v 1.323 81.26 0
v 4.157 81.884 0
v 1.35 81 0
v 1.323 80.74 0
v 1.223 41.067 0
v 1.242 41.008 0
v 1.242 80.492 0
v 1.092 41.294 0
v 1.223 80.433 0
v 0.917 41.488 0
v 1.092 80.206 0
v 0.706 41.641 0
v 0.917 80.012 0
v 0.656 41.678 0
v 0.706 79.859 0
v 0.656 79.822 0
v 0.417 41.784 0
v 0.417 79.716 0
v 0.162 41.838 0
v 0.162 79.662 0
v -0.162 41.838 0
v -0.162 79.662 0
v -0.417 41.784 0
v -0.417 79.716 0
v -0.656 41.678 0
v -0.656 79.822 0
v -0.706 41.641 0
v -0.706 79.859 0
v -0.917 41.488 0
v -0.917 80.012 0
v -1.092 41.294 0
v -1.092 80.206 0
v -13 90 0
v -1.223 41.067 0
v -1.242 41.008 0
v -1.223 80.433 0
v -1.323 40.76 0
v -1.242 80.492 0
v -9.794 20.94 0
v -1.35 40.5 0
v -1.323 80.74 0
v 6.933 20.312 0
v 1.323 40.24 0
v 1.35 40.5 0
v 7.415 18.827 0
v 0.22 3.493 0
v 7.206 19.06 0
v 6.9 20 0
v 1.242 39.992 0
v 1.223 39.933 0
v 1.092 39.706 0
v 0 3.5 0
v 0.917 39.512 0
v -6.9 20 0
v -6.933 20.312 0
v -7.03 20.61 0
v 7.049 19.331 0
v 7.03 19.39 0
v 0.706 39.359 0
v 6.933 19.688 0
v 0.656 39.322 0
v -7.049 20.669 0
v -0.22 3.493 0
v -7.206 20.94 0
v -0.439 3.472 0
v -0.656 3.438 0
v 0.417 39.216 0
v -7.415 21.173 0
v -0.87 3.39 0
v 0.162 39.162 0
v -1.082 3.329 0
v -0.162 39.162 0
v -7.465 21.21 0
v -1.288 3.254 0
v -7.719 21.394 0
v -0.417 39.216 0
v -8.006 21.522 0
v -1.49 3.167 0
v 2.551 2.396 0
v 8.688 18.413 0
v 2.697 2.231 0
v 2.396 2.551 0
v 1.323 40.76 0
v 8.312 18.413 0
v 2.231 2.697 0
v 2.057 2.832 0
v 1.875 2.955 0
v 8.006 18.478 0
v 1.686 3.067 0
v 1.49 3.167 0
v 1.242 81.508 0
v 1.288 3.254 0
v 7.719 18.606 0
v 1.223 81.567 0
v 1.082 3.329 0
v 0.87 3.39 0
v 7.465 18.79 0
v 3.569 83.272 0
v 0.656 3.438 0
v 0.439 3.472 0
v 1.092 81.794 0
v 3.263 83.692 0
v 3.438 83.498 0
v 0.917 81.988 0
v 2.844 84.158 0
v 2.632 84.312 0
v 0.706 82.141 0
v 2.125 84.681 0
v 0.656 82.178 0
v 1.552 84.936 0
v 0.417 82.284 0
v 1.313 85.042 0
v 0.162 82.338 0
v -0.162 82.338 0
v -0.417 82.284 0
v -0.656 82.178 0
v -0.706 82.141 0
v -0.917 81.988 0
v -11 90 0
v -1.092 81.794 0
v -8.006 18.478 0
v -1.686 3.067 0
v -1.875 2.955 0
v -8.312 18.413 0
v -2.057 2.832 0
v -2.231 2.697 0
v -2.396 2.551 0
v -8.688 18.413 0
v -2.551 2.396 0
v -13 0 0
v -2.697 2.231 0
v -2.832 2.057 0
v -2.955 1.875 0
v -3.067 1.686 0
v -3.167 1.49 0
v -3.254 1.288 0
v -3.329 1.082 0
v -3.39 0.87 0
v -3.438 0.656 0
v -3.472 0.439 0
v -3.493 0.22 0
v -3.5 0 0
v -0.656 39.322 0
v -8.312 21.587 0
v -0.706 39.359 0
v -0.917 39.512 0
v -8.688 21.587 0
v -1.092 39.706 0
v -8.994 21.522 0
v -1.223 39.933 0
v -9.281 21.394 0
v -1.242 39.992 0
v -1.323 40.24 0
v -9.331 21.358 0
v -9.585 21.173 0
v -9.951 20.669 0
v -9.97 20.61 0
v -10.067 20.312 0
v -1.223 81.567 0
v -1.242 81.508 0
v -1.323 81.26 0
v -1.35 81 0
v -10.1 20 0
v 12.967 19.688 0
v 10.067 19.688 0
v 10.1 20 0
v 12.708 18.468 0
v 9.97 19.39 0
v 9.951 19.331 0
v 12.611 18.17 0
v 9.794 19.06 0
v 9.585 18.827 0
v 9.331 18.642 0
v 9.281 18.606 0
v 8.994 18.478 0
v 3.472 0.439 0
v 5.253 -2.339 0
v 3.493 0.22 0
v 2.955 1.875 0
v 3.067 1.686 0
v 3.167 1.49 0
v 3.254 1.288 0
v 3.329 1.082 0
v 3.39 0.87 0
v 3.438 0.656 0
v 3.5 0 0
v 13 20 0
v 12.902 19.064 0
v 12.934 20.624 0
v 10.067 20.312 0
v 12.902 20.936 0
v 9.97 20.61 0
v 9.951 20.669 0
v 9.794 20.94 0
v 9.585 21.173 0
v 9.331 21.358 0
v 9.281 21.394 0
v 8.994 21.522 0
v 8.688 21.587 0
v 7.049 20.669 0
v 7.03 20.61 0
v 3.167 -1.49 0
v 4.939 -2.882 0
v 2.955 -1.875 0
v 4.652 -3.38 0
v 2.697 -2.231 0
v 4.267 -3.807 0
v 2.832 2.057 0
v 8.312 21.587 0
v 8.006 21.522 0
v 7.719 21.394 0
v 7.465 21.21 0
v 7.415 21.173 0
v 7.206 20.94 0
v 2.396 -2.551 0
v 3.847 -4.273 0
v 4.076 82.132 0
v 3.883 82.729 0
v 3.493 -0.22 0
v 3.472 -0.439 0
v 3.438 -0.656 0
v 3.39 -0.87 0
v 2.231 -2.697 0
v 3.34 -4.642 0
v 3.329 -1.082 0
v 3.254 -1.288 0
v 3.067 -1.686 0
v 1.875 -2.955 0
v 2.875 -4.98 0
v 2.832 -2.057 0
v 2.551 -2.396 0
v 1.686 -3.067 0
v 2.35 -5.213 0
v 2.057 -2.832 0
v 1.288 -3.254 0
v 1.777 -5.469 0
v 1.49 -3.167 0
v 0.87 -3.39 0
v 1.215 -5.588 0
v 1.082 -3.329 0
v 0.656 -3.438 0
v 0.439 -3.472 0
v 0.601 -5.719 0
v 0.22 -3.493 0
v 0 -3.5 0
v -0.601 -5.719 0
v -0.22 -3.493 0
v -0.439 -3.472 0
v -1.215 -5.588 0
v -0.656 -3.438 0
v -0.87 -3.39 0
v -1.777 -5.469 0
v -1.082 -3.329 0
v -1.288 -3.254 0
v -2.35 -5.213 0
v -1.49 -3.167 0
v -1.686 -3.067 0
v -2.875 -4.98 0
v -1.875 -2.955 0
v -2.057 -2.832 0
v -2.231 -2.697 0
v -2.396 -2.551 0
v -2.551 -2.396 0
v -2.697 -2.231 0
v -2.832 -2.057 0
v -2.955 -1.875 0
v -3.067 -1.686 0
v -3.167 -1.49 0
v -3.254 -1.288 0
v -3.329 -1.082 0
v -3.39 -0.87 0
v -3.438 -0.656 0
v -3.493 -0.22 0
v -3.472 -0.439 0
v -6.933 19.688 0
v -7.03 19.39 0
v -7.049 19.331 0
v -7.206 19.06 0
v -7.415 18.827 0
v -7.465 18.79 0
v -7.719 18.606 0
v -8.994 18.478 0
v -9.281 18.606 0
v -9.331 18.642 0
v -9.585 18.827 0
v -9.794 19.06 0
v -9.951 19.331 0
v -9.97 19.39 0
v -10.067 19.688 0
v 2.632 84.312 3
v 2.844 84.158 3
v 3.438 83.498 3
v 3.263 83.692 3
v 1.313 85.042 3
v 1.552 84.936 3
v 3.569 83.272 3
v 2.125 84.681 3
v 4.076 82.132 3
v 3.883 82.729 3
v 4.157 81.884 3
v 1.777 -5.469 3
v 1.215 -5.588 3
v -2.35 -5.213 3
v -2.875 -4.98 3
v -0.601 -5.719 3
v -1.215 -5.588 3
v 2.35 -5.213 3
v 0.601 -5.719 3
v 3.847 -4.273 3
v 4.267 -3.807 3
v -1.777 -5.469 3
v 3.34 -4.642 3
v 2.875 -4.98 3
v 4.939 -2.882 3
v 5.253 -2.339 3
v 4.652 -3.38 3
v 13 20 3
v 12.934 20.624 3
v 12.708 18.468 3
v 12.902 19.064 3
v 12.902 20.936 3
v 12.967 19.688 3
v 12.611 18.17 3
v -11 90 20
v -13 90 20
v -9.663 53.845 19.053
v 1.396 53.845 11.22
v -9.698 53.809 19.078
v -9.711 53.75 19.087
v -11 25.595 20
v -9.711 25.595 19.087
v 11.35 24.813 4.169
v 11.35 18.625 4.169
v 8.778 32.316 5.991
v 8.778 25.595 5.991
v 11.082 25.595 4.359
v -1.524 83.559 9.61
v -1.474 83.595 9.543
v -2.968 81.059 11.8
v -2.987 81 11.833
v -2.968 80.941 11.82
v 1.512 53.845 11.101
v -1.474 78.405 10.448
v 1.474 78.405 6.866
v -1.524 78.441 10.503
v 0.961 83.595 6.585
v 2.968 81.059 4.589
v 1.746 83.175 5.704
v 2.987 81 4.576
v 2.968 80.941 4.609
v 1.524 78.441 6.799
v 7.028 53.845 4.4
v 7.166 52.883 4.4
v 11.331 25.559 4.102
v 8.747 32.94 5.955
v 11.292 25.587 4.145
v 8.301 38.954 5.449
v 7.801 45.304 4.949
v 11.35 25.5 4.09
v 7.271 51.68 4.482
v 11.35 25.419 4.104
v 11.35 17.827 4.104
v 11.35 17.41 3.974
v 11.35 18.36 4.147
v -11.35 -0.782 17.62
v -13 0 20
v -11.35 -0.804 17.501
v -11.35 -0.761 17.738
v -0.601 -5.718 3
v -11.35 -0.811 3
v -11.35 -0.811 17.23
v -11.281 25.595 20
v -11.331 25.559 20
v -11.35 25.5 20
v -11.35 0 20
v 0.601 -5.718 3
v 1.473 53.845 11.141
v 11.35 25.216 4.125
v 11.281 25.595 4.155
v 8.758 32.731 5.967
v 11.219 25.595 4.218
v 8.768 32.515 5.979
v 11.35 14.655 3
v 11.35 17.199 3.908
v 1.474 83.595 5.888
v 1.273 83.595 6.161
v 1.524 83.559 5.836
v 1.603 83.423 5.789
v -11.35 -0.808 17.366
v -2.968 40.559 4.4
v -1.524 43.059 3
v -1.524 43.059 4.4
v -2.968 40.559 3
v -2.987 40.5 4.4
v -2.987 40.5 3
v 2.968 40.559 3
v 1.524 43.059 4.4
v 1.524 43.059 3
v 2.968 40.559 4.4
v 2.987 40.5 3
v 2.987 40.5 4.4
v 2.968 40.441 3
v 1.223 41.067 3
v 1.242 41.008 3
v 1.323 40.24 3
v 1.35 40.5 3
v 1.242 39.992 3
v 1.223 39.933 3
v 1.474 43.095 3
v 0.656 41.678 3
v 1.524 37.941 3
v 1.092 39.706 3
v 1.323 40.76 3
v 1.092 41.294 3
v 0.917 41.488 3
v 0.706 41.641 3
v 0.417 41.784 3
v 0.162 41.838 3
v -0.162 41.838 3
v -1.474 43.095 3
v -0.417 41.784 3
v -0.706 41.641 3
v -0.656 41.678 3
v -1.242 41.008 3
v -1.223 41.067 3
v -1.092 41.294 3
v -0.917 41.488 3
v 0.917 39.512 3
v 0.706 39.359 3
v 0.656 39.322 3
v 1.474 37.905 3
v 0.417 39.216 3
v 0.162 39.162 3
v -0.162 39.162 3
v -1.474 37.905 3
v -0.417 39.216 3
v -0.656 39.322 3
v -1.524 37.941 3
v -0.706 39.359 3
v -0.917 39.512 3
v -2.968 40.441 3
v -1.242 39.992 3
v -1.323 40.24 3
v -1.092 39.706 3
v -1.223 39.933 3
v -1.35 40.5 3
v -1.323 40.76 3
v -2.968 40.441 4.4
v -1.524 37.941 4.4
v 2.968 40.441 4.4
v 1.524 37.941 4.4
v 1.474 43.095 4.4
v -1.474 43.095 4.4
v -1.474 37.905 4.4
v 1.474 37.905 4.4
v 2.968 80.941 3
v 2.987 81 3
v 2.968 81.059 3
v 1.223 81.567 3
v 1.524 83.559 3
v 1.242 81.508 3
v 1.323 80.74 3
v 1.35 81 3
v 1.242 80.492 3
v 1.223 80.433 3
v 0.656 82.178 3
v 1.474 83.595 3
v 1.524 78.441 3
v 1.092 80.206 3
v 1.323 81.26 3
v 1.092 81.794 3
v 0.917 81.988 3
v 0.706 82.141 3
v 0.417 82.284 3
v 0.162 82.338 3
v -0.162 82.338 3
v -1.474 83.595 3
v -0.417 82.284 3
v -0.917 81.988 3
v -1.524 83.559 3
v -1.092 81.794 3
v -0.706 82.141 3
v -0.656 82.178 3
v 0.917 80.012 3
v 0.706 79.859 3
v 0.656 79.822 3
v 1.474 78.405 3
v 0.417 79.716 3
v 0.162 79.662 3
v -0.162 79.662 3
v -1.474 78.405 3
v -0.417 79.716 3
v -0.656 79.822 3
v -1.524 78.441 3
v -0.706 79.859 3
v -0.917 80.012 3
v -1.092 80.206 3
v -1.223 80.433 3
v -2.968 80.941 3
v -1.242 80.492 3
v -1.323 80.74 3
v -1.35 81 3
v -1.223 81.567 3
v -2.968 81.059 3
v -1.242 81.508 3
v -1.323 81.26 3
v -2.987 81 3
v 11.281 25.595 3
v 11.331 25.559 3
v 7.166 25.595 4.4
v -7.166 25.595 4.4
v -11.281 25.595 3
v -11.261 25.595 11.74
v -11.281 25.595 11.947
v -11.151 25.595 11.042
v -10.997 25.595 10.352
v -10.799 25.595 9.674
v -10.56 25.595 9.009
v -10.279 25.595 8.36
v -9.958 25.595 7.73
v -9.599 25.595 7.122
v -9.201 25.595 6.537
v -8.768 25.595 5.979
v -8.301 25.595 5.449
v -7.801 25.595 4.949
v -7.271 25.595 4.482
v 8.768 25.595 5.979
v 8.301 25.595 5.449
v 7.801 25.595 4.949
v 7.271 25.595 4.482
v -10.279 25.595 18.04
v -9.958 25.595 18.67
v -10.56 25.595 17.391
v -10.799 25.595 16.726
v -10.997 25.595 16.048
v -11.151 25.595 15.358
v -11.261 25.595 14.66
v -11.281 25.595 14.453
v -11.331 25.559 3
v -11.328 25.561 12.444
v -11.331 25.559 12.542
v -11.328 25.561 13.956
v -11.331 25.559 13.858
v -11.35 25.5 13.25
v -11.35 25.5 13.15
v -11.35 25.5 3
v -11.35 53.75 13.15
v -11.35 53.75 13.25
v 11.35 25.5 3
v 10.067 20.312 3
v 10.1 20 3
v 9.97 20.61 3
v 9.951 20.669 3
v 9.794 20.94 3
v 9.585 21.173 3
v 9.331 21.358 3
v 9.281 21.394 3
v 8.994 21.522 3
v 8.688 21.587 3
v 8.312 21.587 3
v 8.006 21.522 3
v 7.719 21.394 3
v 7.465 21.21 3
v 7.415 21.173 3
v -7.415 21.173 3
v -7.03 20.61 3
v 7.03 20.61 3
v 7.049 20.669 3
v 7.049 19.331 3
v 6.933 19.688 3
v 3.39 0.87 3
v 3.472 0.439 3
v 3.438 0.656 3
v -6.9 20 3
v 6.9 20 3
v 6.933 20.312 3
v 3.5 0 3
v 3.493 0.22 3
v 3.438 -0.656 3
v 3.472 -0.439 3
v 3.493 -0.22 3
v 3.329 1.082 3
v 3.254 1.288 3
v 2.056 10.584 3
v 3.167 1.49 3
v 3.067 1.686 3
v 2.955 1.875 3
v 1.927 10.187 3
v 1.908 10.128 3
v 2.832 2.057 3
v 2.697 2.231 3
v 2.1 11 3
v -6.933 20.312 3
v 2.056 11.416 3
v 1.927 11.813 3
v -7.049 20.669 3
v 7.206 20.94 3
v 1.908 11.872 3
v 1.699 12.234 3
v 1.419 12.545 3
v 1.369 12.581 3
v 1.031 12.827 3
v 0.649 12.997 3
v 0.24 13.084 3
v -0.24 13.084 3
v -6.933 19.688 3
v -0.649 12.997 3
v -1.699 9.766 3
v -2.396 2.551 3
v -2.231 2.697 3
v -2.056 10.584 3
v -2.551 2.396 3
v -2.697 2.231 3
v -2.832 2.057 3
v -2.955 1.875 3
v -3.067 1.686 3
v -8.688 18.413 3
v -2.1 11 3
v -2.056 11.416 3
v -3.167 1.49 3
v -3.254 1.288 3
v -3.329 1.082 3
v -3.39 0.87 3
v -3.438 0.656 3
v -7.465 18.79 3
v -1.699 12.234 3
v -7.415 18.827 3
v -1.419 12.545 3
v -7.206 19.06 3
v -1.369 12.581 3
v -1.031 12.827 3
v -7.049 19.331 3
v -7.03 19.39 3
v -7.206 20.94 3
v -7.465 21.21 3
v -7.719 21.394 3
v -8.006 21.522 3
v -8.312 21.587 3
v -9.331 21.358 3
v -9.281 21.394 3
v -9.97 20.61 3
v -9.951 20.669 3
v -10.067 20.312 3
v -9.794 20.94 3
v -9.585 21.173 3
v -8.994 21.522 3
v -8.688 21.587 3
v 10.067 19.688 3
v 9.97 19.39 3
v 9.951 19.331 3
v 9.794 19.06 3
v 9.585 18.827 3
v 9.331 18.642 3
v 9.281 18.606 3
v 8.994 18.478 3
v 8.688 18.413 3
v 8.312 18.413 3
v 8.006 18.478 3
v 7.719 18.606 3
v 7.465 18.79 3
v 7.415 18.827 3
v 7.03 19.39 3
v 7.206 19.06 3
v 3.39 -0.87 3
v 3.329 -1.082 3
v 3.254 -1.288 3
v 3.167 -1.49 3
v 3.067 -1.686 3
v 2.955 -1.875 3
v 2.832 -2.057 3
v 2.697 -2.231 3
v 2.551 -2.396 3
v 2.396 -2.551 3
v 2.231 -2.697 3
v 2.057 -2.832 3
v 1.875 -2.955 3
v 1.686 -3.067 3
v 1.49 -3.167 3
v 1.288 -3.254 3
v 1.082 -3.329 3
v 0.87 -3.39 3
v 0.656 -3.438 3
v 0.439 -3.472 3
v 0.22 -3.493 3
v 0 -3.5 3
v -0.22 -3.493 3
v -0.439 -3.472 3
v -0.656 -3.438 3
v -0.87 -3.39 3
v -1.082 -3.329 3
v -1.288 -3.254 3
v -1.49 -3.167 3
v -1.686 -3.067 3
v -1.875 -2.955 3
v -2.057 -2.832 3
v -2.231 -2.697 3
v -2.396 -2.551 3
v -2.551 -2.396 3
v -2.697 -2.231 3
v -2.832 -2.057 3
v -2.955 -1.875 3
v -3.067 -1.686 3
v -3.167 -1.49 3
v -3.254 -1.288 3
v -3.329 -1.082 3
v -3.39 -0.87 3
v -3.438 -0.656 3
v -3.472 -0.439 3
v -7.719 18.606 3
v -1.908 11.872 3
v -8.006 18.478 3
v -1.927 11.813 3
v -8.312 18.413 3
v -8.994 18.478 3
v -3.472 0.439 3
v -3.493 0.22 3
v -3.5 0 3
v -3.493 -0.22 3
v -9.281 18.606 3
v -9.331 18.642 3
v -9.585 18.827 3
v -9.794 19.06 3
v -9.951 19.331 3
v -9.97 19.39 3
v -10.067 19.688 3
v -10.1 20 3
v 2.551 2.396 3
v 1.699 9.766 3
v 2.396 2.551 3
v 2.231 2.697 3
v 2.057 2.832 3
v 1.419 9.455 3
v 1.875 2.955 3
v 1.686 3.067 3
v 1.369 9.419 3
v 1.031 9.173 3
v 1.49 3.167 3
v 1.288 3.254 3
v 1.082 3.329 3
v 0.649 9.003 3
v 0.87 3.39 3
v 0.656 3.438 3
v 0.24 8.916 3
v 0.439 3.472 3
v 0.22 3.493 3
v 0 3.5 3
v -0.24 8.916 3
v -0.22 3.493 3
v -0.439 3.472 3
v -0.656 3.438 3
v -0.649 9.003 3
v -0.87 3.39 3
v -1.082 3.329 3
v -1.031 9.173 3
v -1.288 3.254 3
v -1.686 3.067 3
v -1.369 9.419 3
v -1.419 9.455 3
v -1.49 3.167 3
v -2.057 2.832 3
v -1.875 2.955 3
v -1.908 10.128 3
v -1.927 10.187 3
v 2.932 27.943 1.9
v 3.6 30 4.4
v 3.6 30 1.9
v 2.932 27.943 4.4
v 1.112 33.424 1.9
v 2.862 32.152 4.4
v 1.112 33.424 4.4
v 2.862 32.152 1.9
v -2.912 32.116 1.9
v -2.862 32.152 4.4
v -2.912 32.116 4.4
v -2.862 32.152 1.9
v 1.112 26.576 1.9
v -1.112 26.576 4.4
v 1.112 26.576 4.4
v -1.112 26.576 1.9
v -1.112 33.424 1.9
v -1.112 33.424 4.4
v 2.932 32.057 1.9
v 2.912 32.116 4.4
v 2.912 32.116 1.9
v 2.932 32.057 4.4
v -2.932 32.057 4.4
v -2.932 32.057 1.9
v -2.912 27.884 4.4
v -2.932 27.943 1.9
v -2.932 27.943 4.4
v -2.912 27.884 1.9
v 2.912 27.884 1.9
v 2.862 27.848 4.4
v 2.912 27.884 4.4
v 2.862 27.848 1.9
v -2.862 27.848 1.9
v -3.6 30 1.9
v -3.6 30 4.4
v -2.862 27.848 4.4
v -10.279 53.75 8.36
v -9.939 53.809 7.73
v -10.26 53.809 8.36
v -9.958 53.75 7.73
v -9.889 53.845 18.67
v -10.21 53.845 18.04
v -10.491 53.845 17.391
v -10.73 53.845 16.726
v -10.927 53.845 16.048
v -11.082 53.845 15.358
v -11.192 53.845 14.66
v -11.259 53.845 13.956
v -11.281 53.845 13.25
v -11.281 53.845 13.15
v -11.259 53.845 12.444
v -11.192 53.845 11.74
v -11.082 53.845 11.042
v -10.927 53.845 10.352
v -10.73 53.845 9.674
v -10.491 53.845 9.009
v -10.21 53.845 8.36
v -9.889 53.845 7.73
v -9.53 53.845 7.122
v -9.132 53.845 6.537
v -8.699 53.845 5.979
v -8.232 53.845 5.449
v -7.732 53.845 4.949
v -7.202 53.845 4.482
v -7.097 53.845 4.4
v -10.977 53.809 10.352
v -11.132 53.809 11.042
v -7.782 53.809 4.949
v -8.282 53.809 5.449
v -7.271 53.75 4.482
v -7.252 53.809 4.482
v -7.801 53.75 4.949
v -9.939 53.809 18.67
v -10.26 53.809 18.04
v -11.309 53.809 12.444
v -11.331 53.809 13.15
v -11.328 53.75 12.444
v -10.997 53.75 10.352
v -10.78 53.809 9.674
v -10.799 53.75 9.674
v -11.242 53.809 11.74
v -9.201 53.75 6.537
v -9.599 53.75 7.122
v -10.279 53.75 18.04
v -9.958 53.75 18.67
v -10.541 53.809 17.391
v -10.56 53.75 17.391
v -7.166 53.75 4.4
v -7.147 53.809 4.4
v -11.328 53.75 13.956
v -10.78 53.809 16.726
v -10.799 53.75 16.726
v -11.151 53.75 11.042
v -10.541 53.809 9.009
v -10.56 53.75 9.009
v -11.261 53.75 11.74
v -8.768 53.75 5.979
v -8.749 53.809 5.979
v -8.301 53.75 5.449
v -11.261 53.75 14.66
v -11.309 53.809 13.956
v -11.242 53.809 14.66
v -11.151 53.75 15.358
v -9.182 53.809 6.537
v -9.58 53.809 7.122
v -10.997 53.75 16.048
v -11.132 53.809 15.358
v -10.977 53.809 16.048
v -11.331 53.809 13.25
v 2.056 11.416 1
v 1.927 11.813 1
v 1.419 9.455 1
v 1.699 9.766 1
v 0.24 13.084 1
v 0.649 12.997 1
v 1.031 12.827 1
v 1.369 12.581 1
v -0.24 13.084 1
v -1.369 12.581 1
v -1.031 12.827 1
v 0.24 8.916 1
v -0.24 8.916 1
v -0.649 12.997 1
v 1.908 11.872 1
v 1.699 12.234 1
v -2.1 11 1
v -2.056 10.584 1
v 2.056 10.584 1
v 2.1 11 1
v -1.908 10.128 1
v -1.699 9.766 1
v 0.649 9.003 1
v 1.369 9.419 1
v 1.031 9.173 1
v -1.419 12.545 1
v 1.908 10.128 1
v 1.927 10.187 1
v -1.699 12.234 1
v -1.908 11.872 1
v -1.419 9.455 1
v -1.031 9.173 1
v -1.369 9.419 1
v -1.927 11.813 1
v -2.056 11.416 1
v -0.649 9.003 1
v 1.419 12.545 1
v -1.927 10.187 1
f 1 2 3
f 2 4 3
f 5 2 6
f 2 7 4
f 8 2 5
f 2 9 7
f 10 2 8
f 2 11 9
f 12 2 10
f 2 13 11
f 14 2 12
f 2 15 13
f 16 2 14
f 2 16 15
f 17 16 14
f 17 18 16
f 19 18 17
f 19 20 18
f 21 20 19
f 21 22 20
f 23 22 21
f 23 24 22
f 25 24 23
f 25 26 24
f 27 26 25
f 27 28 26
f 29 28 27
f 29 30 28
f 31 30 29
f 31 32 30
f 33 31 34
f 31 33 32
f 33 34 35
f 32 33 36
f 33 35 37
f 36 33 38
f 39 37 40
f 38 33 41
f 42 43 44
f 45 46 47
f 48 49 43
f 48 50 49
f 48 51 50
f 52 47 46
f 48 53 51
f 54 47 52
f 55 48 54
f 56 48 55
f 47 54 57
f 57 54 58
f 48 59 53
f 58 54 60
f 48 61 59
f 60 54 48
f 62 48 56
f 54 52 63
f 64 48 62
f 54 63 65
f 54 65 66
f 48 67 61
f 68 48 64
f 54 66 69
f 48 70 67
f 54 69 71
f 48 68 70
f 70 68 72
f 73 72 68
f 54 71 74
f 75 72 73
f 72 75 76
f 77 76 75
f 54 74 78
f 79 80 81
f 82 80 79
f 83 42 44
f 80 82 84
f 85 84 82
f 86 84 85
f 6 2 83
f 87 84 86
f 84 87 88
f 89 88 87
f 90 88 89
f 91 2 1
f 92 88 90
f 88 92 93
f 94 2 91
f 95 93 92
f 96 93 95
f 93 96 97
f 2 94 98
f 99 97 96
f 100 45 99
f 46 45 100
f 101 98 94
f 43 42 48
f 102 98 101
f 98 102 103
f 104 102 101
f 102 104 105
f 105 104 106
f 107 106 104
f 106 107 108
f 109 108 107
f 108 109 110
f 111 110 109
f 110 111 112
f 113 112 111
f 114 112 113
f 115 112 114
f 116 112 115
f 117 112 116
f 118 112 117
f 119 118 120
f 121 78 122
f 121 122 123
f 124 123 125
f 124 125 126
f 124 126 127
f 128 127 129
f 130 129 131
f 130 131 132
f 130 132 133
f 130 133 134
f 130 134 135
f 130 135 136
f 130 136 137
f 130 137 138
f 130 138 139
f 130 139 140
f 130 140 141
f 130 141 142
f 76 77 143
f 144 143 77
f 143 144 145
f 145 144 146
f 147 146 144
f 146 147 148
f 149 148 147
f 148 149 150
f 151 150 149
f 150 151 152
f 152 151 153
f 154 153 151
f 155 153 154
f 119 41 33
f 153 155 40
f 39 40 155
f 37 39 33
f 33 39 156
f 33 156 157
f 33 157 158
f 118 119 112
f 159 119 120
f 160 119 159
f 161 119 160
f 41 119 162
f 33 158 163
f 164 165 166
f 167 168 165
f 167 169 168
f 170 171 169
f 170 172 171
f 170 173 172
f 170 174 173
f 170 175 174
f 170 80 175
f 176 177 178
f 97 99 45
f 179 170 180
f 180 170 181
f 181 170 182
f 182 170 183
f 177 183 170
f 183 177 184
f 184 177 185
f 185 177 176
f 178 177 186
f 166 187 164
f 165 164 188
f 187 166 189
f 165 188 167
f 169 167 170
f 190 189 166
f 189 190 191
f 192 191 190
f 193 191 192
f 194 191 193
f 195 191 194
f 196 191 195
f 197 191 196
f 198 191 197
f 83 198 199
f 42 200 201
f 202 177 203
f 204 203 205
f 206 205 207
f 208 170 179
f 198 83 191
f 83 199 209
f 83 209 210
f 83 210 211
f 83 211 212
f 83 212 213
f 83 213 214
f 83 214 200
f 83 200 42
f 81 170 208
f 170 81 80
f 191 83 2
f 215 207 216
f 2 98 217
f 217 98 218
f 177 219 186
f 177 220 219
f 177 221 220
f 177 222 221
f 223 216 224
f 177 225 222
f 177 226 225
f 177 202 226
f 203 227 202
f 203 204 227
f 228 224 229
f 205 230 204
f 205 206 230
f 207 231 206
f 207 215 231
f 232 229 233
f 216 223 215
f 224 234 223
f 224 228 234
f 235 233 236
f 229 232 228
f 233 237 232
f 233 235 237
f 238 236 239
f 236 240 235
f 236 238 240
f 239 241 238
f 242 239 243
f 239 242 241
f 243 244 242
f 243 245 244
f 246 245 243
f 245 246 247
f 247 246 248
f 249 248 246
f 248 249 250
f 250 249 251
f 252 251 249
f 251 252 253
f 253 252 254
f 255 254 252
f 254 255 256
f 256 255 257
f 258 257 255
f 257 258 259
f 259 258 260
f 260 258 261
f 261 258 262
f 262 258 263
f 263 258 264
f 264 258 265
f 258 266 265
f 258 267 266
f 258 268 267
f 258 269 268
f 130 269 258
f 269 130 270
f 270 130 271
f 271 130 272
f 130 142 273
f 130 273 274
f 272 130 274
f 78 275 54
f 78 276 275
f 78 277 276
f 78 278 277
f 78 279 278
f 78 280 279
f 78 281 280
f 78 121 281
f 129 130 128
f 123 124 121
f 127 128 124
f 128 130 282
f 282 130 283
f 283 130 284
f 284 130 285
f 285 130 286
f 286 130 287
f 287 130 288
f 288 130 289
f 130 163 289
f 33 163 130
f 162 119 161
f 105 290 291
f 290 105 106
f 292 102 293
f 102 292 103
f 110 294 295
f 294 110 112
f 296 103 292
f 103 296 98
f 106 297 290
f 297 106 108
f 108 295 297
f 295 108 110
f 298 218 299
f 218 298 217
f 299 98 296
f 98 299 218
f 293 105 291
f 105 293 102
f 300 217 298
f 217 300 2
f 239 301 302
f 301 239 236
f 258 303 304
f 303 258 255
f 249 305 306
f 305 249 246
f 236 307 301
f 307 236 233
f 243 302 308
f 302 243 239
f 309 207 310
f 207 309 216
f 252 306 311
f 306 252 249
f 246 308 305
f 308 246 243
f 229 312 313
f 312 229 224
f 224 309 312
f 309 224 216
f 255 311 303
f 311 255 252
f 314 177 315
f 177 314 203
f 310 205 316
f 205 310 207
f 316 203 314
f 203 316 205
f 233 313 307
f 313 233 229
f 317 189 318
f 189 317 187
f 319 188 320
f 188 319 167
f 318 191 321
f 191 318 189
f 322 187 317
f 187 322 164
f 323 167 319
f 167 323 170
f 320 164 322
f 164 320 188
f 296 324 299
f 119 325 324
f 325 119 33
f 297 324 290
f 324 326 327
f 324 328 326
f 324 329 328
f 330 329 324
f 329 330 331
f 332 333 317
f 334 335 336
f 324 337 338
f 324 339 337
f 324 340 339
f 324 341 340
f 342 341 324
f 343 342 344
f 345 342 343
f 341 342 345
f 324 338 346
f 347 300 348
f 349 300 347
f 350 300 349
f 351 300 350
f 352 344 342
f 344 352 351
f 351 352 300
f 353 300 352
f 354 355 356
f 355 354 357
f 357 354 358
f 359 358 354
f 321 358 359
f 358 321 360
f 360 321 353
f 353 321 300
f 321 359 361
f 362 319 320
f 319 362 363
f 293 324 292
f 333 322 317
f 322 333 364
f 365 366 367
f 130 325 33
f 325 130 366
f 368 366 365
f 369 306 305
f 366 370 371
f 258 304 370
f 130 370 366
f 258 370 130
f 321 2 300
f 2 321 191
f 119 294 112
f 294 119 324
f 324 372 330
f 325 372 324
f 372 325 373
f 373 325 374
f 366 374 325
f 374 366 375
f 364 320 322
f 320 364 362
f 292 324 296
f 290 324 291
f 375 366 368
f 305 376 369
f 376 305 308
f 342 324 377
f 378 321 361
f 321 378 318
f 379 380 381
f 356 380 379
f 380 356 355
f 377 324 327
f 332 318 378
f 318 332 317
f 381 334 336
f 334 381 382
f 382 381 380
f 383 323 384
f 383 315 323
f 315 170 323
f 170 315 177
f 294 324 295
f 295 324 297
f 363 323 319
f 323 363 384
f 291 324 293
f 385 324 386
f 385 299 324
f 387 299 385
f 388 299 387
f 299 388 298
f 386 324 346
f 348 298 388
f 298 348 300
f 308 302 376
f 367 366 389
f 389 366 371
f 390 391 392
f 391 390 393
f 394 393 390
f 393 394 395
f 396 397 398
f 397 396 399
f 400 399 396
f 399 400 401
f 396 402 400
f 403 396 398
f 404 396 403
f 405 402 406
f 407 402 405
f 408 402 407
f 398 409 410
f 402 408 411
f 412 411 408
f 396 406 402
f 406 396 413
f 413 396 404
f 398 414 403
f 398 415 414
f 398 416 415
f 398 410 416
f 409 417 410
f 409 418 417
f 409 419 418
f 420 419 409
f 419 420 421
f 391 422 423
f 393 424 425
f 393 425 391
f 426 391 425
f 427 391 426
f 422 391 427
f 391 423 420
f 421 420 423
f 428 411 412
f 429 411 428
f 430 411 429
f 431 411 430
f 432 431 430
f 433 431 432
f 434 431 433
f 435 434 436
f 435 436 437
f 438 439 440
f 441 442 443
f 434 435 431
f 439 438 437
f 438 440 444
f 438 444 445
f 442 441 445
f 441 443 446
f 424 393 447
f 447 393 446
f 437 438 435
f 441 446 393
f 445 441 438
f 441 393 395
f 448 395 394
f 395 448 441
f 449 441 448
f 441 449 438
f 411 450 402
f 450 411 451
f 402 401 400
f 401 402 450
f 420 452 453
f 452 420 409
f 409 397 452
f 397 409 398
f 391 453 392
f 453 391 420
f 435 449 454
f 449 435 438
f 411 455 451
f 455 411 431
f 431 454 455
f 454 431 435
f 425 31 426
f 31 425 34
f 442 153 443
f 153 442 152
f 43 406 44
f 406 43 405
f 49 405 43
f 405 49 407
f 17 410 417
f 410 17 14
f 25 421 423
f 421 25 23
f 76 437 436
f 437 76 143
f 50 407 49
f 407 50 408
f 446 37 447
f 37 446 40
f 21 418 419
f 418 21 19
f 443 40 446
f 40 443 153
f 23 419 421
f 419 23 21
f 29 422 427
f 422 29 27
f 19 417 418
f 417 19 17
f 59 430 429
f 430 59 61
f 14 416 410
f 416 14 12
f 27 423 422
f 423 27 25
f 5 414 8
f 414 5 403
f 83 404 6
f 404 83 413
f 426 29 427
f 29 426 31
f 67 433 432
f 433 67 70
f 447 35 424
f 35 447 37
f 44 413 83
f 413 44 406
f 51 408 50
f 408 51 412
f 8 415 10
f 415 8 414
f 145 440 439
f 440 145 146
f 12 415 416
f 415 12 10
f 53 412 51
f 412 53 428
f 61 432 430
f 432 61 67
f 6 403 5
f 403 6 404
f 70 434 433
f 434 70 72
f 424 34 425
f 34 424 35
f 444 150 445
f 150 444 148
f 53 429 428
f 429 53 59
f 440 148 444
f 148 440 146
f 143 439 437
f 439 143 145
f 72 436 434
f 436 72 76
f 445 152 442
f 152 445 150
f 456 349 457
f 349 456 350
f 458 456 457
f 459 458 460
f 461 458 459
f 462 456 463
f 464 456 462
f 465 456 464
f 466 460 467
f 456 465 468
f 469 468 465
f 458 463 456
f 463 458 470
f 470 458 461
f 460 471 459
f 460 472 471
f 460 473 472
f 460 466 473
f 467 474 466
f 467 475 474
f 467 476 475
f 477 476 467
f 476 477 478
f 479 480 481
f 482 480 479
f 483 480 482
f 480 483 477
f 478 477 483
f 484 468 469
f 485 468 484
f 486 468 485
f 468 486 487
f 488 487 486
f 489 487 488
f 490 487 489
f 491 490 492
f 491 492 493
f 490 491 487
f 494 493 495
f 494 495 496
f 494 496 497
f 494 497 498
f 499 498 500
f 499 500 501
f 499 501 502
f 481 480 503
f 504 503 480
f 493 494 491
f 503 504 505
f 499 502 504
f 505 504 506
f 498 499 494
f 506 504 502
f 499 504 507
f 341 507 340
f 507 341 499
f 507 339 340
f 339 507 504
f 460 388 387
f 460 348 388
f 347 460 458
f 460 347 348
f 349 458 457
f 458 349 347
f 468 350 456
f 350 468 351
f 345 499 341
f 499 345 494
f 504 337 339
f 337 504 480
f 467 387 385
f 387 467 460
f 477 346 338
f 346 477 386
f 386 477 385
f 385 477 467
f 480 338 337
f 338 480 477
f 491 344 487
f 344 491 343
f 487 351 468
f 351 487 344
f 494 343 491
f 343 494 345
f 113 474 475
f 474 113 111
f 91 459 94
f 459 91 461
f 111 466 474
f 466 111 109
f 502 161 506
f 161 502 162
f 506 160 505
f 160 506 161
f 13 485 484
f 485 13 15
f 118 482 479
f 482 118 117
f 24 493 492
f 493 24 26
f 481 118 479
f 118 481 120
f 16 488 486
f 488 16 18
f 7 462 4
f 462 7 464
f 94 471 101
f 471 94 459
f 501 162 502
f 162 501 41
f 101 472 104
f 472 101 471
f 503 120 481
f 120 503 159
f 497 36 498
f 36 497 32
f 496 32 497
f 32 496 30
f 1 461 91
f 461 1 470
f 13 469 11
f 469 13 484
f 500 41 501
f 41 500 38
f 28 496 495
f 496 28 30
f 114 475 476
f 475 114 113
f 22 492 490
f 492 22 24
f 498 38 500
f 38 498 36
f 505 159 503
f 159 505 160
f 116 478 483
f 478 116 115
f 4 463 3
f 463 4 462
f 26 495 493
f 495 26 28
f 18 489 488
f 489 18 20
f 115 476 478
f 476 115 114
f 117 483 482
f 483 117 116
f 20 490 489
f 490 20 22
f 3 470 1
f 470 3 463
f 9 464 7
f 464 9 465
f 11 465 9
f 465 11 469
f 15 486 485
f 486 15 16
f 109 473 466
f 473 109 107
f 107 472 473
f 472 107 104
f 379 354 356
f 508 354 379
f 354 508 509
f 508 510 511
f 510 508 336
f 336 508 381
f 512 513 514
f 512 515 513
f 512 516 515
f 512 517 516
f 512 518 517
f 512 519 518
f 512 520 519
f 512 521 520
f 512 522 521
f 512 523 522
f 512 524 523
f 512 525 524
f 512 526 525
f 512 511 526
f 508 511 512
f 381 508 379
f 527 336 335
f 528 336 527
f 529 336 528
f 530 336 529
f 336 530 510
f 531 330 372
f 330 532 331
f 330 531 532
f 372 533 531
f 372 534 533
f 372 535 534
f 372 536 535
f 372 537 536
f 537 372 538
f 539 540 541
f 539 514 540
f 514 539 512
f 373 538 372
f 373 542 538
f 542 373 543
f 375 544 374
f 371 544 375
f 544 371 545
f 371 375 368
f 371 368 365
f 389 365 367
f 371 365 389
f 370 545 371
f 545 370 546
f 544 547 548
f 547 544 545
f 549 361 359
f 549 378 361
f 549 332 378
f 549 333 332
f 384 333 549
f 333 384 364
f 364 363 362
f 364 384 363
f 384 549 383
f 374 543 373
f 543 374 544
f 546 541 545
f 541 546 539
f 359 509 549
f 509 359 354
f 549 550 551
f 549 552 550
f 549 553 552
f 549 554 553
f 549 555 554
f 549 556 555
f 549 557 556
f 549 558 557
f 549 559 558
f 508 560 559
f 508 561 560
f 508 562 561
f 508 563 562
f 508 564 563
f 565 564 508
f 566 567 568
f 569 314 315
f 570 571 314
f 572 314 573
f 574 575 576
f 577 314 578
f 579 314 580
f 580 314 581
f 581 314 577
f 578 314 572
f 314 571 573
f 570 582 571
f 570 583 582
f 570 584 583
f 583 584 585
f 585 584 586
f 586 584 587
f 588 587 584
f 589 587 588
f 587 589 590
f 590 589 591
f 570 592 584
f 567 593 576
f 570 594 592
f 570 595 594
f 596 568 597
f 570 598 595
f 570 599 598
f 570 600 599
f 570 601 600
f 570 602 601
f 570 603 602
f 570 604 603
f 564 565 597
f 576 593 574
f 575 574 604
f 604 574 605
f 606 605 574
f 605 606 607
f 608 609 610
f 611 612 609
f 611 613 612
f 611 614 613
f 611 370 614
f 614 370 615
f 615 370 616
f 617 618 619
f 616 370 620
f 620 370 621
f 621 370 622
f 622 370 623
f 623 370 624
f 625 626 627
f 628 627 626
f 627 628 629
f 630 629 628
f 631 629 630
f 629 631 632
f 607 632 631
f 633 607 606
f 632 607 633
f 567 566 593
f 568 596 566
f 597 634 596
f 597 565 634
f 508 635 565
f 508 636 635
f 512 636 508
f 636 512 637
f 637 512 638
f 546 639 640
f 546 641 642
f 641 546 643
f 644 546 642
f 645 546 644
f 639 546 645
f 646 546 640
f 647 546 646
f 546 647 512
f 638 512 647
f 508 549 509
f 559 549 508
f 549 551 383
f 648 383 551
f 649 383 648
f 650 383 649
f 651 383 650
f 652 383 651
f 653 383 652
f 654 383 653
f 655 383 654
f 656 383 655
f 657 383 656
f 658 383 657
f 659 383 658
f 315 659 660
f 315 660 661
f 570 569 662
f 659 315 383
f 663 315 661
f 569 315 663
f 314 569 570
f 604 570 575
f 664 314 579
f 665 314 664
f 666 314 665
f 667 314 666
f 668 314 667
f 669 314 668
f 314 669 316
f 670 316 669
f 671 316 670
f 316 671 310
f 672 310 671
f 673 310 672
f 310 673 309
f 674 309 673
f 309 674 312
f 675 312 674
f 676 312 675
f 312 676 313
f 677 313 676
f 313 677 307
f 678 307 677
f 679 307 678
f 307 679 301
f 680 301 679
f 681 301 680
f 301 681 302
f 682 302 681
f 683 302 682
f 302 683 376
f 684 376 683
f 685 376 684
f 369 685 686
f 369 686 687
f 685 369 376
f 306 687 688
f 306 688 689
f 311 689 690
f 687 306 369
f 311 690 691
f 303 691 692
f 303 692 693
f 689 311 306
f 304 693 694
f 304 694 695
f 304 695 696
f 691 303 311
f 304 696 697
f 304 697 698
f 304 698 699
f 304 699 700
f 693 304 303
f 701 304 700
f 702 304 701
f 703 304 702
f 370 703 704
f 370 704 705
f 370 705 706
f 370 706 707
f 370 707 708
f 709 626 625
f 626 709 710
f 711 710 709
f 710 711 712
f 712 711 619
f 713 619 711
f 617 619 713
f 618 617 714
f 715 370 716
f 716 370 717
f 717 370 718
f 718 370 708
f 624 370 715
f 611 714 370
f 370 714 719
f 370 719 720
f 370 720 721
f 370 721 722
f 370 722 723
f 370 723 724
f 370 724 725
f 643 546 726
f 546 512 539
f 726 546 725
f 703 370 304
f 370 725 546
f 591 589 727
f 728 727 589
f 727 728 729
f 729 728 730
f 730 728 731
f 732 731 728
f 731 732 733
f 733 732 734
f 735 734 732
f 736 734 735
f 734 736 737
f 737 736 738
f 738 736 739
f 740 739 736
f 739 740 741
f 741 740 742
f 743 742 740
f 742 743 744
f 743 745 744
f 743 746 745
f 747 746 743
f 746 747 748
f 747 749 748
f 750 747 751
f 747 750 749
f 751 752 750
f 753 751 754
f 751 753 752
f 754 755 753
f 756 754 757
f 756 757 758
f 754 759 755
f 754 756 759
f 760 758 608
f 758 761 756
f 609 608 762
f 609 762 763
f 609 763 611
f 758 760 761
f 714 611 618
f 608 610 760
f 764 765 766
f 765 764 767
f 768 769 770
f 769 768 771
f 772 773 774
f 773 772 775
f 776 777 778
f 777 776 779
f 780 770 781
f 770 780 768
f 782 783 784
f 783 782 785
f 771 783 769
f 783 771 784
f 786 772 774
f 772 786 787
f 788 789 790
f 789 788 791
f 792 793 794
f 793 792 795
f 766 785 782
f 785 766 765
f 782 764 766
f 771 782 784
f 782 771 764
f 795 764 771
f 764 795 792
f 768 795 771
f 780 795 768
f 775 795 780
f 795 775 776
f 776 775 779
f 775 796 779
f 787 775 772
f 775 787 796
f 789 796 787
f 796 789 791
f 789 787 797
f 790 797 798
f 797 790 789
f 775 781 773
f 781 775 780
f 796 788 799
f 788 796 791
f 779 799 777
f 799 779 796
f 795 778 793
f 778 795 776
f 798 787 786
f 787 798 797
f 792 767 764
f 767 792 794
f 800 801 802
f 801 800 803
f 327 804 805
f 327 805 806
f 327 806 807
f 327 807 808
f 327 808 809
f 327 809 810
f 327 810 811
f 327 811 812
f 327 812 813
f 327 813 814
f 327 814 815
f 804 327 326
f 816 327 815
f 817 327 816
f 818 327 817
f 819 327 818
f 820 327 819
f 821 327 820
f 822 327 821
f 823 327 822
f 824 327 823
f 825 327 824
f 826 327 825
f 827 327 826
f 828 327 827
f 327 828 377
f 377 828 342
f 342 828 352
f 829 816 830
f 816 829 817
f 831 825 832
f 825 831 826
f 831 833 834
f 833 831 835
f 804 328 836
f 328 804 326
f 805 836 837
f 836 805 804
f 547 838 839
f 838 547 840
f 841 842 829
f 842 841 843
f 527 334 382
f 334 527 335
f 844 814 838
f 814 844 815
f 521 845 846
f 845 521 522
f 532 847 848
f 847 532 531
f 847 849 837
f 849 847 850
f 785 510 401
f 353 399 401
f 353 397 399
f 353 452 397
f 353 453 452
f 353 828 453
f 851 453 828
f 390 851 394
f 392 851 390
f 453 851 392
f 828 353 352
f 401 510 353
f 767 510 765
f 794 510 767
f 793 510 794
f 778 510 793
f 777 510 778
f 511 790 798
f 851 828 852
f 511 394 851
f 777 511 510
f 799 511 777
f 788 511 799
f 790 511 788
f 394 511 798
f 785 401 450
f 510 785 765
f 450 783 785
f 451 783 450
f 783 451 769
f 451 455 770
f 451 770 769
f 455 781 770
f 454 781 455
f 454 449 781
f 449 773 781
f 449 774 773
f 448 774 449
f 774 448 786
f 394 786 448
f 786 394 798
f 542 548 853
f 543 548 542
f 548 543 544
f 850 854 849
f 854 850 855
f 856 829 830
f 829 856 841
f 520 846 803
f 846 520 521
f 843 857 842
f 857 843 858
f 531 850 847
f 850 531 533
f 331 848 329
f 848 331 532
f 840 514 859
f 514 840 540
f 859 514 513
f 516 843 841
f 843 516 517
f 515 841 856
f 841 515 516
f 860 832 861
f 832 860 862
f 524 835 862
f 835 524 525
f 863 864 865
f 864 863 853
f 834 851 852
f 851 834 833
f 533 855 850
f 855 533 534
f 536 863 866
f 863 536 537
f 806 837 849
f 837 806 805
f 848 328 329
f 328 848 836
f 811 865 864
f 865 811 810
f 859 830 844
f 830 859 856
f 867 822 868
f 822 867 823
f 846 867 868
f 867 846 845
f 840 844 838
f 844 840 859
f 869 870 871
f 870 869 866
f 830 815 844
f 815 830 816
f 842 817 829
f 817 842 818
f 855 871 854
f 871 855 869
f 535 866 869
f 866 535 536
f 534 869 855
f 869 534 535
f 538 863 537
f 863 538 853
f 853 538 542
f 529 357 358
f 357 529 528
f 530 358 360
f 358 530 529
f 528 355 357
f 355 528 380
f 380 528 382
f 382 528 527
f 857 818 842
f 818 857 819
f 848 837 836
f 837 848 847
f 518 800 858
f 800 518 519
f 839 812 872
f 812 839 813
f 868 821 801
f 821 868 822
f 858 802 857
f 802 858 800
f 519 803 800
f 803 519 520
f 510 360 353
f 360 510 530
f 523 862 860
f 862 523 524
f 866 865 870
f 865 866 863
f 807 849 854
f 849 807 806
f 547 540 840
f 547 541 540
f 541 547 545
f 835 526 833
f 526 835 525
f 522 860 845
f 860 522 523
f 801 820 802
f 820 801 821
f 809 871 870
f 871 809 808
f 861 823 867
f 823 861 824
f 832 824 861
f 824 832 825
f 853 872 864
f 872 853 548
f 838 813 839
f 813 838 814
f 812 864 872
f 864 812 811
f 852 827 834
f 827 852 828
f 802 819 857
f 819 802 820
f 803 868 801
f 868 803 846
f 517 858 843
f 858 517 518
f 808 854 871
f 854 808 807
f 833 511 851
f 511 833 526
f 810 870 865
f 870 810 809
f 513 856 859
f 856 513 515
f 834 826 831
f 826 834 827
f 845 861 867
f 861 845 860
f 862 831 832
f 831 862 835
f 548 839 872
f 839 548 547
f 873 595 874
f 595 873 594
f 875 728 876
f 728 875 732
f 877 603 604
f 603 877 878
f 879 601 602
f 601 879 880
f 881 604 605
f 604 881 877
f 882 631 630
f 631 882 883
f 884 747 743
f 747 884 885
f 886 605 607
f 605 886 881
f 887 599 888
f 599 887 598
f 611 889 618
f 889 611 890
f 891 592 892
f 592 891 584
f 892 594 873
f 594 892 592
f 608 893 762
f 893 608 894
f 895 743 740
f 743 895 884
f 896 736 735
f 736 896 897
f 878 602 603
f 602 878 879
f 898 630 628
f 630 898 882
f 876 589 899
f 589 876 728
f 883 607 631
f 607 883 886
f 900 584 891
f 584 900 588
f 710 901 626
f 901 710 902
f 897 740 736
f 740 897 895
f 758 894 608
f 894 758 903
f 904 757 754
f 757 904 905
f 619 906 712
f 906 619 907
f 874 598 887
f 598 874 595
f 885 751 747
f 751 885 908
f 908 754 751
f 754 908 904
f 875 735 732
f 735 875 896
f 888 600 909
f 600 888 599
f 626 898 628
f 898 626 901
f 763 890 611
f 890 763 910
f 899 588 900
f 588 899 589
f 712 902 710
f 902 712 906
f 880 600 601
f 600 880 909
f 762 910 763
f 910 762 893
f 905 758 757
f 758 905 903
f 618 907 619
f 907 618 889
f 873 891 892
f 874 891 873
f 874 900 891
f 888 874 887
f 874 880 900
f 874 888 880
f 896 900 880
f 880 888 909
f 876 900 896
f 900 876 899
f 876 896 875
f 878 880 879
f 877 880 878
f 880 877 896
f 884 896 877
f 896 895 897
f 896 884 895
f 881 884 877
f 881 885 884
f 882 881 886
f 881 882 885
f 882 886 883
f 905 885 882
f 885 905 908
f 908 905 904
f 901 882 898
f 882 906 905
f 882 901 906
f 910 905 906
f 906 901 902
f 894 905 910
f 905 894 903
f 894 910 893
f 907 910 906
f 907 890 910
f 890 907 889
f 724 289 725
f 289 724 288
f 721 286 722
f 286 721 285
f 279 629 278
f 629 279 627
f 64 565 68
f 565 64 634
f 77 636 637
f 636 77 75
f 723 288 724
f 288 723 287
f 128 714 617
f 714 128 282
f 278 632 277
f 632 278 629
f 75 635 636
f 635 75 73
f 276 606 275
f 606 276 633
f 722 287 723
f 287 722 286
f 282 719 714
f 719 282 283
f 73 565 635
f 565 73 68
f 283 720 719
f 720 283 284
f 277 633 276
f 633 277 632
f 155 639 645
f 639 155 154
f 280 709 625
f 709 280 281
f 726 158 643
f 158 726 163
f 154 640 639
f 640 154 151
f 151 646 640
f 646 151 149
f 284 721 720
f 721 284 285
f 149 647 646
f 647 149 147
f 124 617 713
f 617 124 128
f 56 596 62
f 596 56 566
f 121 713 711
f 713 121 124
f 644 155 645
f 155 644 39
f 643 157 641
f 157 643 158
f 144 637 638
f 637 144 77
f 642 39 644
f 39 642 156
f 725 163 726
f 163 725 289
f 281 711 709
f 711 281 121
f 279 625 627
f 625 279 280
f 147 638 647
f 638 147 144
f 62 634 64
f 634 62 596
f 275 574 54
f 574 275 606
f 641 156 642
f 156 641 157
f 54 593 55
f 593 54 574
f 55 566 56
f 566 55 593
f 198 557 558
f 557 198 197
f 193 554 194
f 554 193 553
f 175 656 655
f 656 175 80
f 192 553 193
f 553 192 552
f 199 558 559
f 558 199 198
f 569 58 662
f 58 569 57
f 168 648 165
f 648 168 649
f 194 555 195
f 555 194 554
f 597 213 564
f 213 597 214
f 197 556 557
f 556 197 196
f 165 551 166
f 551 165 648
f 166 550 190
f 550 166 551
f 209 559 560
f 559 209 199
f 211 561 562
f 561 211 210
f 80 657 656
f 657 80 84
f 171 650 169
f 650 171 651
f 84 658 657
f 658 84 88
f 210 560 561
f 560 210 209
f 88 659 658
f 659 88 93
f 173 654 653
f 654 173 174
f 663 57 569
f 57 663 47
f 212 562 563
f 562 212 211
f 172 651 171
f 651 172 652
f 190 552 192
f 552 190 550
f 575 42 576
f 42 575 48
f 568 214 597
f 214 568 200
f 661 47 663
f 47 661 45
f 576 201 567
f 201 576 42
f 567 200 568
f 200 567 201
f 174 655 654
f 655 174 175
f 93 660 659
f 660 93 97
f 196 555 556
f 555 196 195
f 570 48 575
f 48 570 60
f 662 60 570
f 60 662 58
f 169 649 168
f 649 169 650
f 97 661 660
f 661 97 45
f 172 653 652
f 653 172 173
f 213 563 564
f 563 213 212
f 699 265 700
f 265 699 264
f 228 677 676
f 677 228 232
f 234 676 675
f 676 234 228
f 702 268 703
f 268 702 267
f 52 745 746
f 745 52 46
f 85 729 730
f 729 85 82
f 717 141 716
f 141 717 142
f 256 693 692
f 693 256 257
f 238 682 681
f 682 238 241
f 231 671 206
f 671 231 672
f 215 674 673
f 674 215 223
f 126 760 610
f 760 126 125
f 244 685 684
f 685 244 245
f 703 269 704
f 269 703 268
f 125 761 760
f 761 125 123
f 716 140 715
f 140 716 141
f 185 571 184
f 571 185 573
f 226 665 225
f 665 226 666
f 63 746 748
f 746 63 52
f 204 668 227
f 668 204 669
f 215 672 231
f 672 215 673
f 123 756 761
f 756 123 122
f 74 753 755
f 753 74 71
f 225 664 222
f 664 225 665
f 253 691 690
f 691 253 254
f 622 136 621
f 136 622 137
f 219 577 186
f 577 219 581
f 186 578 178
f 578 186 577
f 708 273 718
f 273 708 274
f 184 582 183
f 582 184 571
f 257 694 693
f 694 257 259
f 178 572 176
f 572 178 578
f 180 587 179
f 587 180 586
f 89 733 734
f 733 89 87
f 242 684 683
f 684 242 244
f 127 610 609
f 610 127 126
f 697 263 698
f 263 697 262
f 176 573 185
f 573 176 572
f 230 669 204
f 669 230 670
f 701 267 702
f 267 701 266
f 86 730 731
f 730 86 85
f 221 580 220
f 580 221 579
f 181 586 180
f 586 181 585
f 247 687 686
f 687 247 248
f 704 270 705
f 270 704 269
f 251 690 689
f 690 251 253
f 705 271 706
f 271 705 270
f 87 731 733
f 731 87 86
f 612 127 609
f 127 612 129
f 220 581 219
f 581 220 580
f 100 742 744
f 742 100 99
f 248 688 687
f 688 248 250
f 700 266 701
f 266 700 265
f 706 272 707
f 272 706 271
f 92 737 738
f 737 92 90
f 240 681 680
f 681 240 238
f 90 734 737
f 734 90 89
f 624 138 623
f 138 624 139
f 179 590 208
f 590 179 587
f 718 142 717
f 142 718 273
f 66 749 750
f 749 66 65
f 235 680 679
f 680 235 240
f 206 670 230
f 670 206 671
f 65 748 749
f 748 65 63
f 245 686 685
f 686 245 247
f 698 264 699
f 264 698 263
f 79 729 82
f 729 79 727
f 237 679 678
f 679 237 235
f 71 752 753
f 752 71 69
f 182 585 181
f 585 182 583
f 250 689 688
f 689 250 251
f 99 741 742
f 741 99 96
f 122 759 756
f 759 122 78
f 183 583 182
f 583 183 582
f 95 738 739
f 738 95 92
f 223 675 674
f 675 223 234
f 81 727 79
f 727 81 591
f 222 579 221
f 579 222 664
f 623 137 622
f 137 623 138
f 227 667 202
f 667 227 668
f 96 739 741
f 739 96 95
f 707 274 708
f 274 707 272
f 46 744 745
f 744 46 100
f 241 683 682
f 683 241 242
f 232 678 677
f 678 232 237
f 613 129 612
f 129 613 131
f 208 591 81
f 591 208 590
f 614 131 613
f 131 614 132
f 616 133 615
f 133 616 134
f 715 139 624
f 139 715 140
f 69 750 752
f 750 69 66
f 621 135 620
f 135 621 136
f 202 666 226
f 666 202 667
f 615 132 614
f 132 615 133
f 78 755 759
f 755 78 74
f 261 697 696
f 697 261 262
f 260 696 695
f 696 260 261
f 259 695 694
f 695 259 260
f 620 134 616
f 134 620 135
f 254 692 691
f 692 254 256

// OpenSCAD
// file: hexnut.scad
module hexnut(flats=10, depth=5){
  sliceangle = 360 / 6;
  pointradius = flats / (2 * cos(sliceangle/2));
  flatoffset = flats * tan(sliceangle/2) / 2;
  union(){
    for(angle=[0:sliceangle:360]) {
      rotate(angle,[0,0,1]) linear_extrude(height=depth) polygon(points=[[0,-1],[flatoffset,flats/2],[-flatoffset,flats/2]],paths=[[0,1,2]]);
    }
  }
}
// file: yellow_motor.scad
module yellow_motor(screw_protrusion = 10) {
    motor_width = 18.9;
    motor_depth = 22.5;
    shaft_radius = 5.5 / 2;
    shaft_length = 36.5;
    shaft_protrusion_radius = 7 / 2;
    shaft_to_knob = 11;
    knob_radius = 4 / 2;
    knob_height = 2;
    shaft_to_screw_holes = [8.5, 20];
    screw_hole_radius = 3 / 2;
    shaft_to_clip = 30;
    clip_radius = 7 / 2;
    clip_height = 1;
    across_clips = 22.5;
    shaft_to_back_edge = 11.5;
    shaft_to_front_edge = 25.5;
    round_body_flats = 17.5;
    round_body_radius = 22.5/2;
    total_body_length = 65.25;
    
    // motor body
    translate([0, -shaft_to_back_edge, 0]) {
        // body bit
        translate([-motor_depth / 2, 0, 0]) cube([motor_depth, shaft_to_back_edge + shaft_to_front_edge, motor_width]);
        // round bit and clips
        translate([0, 0, motor_width - round_body_flats]) {
            // clips
            translate([0, shaft_to_back_edge + shaft_to_clip, -1 * (across_clips - round_body_flats) / 2]) cylinder(r = clip_radius, h = across_clips, $fn = 10);
            // round body
            intersection() {
                translate([-round_body_radius, 0, 0]) cube([round_body_radius*2, total_body_length, round_body_flats]);
                translate([0, 0, round_body_flats / 2])
                    rotate([270, 0, 0])
                        cylinder(r = round_body_radius, h = total_body_length, $fn = 100);
            }
        }
    }
    // knob
    translate([0, shaft_to_knob, -knob_height]) cylinder(r = knob_radius, h = knob_height, $fn = 30);
    
    // motor shaft
    translate([0, 0, motor_width / 2]) cylinder(r = shaft_radius, h = shaft_length, center = true, $fn = 30);
    
    // screw holes
    for(m = [0,1]) {
        mirror([m, 0, 0]) translate([shaft_to_screw_holes[0], shaft_to_screw_holes[1], -screw_protrusion]) cylinder(r = screw_hole_radius, h = screw_protrusion * 2 + motor_width, $fn = 30);
    }
}

yellow_motor();
// main file
use <yellow_motor.scad>
use <hexnut.scad>
side_thickness = 2;
screw_radius = 2.5 / 2;

module bot_side(side_depth = 30, side_length = 90, side_thickness = 3, side_holes = [40.5, 81]) {
    module side_shape(h = side_thickness) {
        translate([-side_depth / 2, 0, 0])
            cube([side_depth, side_length, h]);
    }
        
    module cutouts(h = side_thickness) {
        intersection() {
            linear_extrude(height = h) projection() yellow_motor();
            union() {
                translate([0, 0, side_thickness])
                    yellow_motor();
            }
        }
        for(hole = side_holes) {
            translate([0, hole, 0]) {
                cylinder(r = screw_radius, h = h, $fn = 30);
                if(h >= side_thickness) {
                    translate([0, 0, 3]) hexnut(flats = 5, depth = h - 1);
                }
            }
        }
    }
    
    module cutout_walls(h = 2){
        mink_h = 0.09;
        minkowski() {
            cutouts(h = h - mink_h);
            cylinder(r = 3, h = 0.09, $fn = 30);
        }
    }
    
    difference() {
        union() {
            hull() {
                cutout_walls(h = 3);
                translate([-13, 0, 0]) cube([2, 90, 20]);
            }
            cutout_walls(h = side_thickness);
            translate([-1, 0, 0]) cube([2, side_holes[1], 2]);
        }
        union() {
            minkowski() {
                cutouts(h = 20);
                cylinder(r = 0.1, h = 0.1, $fn = 10);
            }
            cylinder(r = 7 / 2, h = 10, $fn = 100);
        }
    }
}
//mirror([1, 0, 0])
bot_side();
